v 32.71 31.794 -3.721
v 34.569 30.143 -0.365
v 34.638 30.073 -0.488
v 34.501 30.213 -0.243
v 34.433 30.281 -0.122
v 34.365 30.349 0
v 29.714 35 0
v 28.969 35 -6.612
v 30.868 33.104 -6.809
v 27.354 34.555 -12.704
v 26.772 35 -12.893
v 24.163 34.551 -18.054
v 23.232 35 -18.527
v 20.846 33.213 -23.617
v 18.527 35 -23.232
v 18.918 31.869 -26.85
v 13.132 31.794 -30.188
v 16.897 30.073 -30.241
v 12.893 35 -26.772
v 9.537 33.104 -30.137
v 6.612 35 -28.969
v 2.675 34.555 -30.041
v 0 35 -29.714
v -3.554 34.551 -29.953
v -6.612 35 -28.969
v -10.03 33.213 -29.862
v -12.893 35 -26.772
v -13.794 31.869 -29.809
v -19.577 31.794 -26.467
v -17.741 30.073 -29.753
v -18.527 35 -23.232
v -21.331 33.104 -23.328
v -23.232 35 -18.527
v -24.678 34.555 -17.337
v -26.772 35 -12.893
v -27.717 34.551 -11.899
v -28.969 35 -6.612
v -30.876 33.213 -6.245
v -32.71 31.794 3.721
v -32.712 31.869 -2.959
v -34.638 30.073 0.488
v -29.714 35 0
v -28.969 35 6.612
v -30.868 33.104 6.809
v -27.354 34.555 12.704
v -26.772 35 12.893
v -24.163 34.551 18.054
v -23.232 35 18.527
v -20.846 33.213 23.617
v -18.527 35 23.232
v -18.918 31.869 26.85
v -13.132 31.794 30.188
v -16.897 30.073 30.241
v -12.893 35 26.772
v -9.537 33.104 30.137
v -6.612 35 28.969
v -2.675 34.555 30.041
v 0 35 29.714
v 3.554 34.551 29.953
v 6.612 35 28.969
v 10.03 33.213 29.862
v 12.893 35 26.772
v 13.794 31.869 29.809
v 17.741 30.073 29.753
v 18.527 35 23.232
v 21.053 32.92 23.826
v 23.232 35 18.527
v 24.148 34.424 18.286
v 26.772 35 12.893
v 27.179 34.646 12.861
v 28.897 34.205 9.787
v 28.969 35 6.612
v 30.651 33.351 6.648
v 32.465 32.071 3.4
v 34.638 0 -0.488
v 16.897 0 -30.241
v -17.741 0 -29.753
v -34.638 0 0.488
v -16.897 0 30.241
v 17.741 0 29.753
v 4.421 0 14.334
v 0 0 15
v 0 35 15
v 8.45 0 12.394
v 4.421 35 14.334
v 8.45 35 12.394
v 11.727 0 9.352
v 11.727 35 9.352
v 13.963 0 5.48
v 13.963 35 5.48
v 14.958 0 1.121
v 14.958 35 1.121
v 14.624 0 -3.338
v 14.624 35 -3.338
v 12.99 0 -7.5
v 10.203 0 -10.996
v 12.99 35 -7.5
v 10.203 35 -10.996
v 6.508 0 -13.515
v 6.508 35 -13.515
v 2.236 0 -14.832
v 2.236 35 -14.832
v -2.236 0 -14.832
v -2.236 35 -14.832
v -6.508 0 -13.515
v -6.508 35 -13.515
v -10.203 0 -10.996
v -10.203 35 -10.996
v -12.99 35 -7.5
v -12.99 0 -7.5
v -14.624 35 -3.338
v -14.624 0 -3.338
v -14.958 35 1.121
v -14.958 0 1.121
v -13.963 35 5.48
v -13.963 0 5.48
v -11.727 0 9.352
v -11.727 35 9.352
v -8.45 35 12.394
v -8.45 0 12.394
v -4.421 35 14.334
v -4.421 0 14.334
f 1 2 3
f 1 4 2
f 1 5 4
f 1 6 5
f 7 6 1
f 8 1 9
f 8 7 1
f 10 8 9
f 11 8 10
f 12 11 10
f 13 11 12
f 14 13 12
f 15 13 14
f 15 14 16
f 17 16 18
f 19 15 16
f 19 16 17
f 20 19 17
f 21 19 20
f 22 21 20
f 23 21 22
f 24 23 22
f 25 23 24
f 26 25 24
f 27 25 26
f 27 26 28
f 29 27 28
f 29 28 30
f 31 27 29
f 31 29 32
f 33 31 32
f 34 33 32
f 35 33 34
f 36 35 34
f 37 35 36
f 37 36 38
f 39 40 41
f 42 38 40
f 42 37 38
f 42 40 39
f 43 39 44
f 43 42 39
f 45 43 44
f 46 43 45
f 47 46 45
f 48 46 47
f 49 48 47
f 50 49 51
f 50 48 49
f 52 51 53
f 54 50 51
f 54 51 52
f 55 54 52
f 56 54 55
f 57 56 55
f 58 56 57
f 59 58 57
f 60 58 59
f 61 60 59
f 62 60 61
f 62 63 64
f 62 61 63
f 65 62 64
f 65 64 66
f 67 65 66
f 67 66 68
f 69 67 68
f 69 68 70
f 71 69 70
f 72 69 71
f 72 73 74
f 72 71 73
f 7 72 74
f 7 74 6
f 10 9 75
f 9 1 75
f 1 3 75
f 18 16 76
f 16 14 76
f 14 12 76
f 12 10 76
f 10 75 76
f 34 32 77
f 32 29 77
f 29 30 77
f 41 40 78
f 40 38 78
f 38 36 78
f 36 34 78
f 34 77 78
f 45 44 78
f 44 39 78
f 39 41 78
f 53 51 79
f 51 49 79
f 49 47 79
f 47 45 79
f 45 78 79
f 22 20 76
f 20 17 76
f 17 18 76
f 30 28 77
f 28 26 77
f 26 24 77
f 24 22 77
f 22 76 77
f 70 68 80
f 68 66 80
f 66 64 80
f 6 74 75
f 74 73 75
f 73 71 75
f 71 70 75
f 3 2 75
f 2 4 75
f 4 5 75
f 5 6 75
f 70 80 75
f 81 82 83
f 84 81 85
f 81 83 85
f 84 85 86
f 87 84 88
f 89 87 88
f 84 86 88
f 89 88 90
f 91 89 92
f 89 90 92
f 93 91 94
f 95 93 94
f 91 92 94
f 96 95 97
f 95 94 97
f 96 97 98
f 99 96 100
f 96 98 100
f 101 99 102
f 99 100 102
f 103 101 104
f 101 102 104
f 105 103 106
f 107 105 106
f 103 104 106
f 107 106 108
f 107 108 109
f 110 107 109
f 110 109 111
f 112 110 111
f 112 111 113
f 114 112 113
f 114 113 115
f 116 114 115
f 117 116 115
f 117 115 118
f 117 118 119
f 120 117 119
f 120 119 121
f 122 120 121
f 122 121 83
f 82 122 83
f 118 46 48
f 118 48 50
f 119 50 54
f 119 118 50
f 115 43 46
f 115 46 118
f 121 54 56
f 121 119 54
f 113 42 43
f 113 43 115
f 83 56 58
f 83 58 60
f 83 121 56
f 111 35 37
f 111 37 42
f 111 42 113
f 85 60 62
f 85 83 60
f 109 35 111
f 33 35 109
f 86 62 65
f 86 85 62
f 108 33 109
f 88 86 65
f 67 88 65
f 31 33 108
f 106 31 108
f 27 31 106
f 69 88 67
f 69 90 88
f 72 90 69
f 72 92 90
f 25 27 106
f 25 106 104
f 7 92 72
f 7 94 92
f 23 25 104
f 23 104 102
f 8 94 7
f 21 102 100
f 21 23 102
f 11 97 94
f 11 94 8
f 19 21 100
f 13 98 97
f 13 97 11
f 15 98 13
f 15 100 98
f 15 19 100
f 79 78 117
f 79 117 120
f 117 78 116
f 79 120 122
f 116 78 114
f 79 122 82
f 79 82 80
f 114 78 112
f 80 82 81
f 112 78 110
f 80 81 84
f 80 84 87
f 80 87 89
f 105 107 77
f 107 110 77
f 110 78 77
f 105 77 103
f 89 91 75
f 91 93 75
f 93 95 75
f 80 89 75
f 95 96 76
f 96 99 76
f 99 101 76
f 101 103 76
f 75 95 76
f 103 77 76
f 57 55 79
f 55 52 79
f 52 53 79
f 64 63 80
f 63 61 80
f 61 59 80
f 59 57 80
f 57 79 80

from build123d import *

# Parameters (mm, degrees)
BOSS_EXTRUDE1_DEPTH = 35
SKETCH2_R           = 15
CUT_EXTRUDE1_DEPTH  = 58.786414072
SKETCH6_OUTSIDE_W   = 110.956
SKETCH6_OUTSIDE_H   = 102.162
SKETCH6_OUTSIDE_R   = 29.714468975
CUT_EXTRUDE5_DEPTH  = 10
CUT_EXTRUDE5_DRAFT  = -45


with BuildPart() as part:
    # Sketch1 → Boss-Extrude1 (new body)
    with BuildSketch(Plane(origin=(0, 0, 0), x_dir=(1, 0, 0), z_dir=(0, 1, 0))):
        Polygon((17.741058042, -29.753232758), (34.637584434, 0.487590575), (16.896526392, 30.240823333), (-17.741058042, 29.753232758), (-34.637584434, -0.487590575), (-16.896526392, -30.240823333), align=None)
    extrude(amount=BOSS_EXTRUDE1_DEPTH)

    # Sketch2 → Cut-Extrude1 (cut, through all)
    with BuildSketch(Plane(origin=(0, 35, 0), x_dir=(1, 0, 0), z_dir=(0, 1, 0))):
        with Locations(Location((0, 0, 0), (0, 0, 270))):
            Circle(SKETCH2_R)
    extrude(amount=-CUT_EXTRUDE1_DEPTH, mode=Mode.SUBTRACT)


with BuildPart() as cut_extrude5_tool:
    # Sketch6 outside → Cut-Extrude5 (with draft: the straight prism first)
    with BuildSketch(Plane(origin=(0, 35, 0), x_dir=(1, 0, 0), z_dir=(0, 1, 0))):
        Rectangle(SKETCH6_OUTSIDE_W, SKETCH6_OUTSIDE_H)
        Circle(SKETCH6_OUTSIDE_R, mode=Mode.SUBTRACT)
    extrude(amount=-CUT_EXTRUDE5_DEPTH)
    # Cut-Extrude5: the draft: its side faces are tilted about the plane it starts from
    cut_extrude5_sides = [cut_extrude5_tool.faces().sort_by_distance(p)[0] for p in [
        (0, 30, 51.081),
        (55.478, 30, 0),
        (0, 30, -51.081),
        (-55.478, 30, 0),
        (-29.714468975, 30, 0),
    ]]
    draft(cut_extrude5_sides, Plane(origin=(0, 35, 0), x_dir=(1, 0, 0), z_dir=(0, 1, 0)), CUT_EXTRUDE5_DRAFT)


with BuildPart() as part_1:
    add(part.part)

    # Cut-Extrude5: cut by cut_extrude5_tool
    add(cut_extrude5_tool.part, mode=Mode.SUBTRACT)


solid = part_1.part
